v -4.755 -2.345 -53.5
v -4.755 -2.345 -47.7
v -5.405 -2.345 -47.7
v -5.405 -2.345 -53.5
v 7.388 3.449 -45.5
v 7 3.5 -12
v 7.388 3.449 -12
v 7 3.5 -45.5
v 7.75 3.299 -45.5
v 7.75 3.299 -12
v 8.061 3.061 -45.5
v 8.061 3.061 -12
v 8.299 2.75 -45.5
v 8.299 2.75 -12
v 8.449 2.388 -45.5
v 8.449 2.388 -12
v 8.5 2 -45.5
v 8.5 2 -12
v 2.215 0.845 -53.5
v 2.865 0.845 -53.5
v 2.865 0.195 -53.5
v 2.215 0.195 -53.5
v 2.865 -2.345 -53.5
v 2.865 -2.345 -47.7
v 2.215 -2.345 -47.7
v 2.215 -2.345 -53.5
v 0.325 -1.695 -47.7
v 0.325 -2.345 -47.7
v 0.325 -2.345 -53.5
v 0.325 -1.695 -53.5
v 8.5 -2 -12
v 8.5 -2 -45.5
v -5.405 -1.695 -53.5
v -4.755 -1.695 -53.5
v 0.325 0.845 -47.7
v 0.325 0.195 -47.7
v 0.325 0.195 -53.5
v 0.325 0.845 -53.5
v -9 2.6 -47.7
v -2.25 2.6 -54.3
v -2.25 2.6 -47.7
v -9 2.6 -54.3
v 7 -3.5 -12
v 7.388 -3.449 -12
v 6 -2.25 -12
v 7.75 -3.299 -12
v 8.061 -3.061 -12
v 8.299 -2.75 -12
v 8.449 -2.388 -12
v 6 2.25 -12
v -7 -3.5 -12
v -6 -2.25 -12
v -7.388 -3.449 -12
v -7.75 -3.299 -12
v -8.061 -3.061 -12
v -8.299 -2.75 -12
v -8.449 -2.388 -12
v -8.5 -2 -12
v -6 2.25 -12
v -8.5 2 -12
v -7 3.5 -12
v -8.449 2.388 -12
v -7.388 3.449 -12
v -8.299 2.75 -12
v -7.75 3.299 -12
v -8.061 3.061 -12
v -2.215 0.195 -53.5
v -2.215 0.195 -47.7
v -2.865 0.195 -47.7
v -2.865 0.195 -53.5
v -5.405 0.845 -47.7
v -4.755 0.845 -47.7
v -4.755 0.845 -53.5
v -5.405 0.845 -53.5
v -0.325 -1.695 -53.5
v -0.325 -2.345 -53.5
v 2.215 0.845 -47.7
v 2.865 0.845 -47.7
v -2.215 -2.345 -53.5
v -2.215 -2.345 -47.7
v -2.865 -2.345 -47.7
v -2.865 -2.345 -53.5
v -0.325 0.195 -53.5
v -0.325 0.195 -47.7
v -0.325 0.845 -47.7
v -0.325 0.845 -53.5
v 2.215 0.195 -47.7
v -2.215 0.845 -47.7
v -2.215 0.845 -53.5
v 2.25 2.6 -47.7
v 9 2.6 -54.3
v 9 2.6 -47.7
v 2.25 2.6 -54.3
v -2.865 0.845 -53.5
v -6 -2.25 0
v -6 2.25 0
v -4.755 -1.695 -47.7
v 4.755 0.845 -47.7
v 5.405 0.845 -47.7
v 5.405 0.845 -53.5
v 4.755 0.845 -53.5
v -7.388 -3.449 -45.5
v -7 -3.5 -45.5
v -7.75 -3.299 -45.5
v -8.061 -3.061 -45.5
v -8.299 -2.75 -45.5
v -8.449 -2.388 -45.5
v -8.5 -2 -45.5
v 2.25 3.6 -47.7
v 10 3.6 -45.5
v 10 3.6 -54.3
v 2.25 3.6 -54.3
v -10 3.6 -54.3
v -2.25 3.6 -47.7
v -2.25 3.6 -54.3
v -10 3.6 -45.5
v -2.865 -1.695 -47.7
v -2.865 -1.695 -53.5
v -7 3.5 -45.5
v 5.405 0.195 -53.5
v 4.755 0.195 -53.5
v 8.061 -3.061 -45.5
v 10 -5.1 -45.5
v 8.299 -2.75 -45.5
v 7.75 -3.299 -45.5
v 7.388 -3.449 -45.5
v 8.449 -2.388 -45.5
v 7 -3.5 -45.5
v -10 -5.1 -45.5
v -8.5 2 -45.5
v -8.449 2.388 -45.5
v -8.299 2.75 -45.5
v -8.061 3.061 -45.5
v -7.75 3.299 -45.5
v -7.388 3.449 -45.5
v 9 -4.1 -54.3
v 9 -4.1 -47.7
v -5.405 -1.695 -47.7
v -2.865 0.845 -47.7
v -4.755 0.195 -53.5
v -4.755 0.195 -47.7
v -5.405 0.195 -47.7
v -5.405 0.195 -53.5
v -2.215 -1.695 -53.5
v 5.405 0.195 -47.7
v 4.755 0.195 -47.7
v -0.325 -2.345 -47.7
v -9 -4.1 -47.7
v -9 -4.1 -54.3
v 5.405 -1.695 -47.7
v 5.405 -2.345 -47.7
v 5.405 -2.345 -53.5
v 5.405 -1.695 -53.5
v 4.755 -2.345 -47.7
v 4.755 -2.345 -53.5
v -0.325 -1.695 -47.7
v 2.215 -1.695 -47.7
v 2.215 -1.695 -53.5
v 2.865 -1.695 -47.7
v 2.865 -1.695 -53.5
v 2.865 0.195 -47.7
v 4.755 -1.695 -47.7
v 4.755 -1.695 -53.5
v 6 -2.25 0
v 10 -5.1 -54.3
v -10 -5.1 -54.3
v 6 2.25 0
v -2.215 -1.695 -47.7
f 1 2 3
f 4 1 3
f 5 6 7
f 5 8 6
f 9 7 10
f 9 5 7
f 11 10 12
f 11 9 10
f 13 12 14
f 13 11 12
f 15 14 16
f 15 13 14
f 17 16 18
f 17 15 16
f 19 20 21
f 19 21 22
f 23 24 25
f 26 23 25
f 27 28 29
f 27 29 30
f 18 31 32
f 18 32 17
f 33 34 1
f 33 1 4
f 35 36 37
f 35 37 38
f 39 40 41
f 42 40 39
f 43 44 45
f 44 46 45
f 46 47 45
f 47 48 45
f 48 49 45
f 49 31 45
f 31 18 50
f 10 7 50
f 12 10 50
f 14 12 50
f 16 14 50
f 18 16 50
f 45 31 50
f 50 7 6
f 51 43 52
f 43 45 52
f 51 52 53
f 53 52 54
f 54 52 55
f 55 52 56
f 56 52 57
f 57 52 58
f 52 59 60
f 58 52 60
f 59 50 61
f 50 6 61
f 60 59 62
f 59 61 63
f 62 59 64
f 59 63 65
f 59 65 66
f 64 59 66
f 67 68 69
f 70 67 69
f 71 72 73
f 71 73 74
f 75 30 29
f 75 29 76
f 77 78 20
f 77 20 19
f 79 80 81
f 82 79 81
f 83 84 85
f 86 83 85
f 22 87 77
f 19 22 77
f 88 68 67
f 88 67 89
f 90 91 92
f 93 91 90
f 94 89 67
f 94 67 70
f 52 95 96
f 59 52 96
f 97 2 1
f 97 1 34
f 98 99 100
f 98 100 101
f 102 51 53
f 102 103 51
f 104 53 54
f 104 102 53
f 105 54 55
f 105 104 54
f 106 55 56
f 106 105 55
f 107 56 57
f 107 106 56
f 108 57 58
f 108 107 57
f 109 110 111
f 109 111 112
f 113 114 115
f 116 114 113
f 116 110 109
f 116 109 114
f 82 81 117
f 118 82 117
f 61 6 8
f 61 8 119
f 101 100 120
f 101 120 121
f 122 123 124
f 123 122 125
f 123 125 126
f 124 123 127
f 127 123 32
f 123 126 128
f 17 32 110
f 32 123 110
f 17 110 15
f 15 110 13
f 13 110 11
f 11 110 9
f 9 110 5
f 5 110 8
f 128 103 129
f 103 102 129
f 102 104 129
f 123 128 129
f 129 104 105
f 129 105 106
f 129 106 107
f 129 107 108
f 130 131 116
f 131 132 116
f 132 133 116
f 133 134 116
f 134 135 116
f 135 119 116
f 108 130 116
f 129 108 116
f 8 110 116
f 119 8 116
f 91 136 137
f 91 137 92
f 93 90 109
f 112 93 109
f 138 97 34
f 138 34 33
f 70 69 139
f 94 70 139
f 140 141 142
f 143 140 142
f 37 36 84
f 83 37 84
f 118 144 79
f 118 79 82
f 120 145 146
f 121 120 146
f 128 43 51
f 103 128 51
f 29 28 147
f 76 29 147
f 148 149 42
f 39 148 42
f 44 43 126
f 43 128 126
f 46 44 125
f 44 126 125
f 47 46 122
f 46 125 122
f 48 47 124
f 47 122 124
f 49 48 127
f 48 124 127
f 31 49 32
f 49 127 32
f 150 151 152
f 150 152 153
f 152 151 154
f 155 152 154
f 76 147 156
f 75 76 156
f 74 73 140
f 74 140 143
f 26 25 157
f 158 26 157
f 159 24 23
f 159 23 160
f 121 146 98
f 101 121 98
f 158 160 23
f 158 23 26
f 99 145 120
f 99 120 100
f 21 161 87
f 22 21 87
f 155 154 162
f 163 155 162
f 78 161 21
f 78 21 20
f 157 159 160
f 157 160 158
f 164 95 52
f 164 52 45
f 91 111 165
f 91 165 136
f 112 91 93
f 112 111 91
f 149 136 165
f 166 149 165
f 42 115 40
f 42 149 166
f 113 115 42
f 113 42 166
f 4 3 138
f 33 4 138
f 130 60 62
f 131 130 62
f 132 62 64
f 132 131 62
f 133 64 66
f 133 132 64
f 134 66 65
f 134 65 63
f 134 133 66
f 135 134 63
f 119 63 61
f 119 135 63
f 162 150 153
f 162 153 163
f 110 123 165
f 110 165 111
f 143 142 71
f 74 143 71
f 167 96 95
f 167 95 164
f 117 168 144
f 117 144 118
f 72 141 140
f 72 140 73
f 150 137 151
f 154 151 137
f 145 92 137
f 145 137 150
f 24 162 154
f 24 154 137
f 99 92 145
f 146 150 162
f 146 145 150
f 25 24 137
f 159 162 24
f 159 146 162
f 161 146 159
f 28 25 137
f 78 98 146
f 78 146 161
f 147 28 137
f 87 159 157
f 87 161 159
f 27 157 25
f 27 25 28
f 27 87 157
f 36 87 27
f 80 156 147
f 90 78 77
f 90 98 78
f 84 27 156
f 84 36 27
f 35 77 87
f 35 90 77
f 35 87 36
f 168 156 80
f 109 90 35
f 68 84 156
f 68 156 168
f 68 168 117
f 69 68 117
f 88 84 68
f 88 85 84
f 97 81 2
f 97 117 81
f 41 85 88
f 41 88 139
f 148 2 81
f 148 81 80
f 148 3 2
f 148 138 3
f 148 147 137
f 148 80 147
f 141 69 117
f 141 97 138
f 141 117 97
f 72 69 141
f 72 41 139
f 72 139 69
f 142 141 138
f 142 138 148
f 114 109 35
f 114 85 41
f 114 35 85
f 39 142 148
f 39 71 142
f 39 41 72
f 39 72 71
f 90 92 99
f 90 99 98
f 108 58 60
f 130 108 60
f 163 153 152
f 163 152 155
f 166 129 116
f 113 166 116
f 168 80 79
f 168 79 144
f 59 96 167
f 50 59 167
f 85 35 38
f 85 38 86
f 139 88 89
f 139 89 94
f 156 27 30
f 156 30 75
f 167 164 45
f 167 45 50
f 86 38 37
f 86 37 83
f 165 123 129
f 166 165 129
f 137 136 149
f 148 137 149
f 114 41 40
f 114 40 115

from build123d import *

# Parameters (mm, degrees)
SKETCH1_W           = 12
SKETCH1_H           = 4.5
BOSS_EXTRUDE1_DEPTH = 12
SKETCH2_W           = 17
SKETCH2_H           = 7
BOSS_EXTRUDE2_DEPTH = 33.5
SKETCH3_W           = 20
SKETCH3_H           = 8.7
BOSS_EXTRUDE3_DEPTH = 8.8
SKETCH4_W           = 18
SKETCH4_H           = 6.7
SKETCH4_W_2         = 4.5
SKETCH4_H_2         = 1
CUT_EXTRUDE2_DEPTH  = 6.6
SKETCH5_W           = 0.65
SKETCH5_H           = 0.65
BOSS_EXTRUDE4_DEPTH = 5.8
LPATTERN1_COUNT     = 3
LPATTERN1_PITCH     = 2.54
LPATTERN1_COL_COUNT = 3
LPATTERN1_COL_PITCH = 2.54
FILLET1_R           = 1.5


with BuildPart() as part:
    # Sketch1 → Boss-Extrude1 (new body)
    with BuildSketch(Plane.XY):
        Rectangle(SKETCH1_W, SKETCH1_H)
    extrude(amount=-BOSS_EXTRUDE1_DEPTH)

    # Sketch2 → Boss-Extrude2 (add)
    with BuildSketch(Plane(origin=(0, 0, -12), x_dir=(-1, 0, 0), z_dir=(0, 0, -1))):
        Rectangle(SKETCH2_W, SKETCH2_H)
    extrude(amount=BOSS_EXTRUDE2_DEPTH)

    # Sketch3 → Boss-Extrude3 (add)
    with BuildSketch(Plane(origin=(0, 0, -45.5), x_dir=(-1, 0, 0), z_dir=(0, 0, -1))):
        with Locations((0, -0.75)):
            Rectangle(SKETCH3_W, SKETCH3_H)
    extrude(amount=BOSS_EXTRUDE3_DEPTH)

    # Sketch4 → Cut-Extrude2 (cut)
    with BuildSketch(Plane(origin=(0, 0, -54.3), x_dir=(-1, 0, 0), z_dir=(0, 0, -1))):
        with Locations((0, -0.75)):
            Rectangle(SKETCH4_W, SKETCH4_H)
        with Locations((0, 3.1)):
            Rectangle(SKETCH4_W_2, SKETCH4_H_2)
    extrude(amount=-CUT_EXTRUDE2_DEPTH, mode=Mode.SUBTRACT)

    # Sketch5 → Boss-Extrude4 (add)
    with BuildSketch(Plane(origin=(0, 0, -47.7), x_dir=(-1, 0, 0), z_dir=(0, 0, -1))):
        with Locations((0, 0.52)):
            Rectangle(SKETCH5_W, SKETCH5_H)
        with Locations((0, -2.02)):
            Rectangle(SKETCH5_W, SKETCH5_H)
    boss_extrude4 = extrude(amount=BOSS_EXTRUDE4_DEPTH)

    # LPattern1: Boss-Extrude4 ×3
    with Locations(*[(i * LPATTERN1_PITCH, 0, 0) for i in range(1, LPATTERN1_COUNT)]):
        add(boss_extrude4)

    # LPattern1 col: Boss-Extrude4 ×3
    with Locations(*[(-i * LPATTERN1_COL_PITCH, 0, 0) for i in range(1, LPATTERN1_COL_COUNT)]):
        add(boss_extrude4)

    # Fillet1
    fillet1_edges = [part.edges().sort_by_distance(p)[0] for p in [
        (8.5, 3.5, -28.75),
        (8.5, -3.5, -28.75),
        (-8.5, -3.5, -28.75),
        (-8.5, 3.5, -28.75),
    ]]
    fillet(fillet1_edges, radius=FILLET1_R)


solid = part.part
